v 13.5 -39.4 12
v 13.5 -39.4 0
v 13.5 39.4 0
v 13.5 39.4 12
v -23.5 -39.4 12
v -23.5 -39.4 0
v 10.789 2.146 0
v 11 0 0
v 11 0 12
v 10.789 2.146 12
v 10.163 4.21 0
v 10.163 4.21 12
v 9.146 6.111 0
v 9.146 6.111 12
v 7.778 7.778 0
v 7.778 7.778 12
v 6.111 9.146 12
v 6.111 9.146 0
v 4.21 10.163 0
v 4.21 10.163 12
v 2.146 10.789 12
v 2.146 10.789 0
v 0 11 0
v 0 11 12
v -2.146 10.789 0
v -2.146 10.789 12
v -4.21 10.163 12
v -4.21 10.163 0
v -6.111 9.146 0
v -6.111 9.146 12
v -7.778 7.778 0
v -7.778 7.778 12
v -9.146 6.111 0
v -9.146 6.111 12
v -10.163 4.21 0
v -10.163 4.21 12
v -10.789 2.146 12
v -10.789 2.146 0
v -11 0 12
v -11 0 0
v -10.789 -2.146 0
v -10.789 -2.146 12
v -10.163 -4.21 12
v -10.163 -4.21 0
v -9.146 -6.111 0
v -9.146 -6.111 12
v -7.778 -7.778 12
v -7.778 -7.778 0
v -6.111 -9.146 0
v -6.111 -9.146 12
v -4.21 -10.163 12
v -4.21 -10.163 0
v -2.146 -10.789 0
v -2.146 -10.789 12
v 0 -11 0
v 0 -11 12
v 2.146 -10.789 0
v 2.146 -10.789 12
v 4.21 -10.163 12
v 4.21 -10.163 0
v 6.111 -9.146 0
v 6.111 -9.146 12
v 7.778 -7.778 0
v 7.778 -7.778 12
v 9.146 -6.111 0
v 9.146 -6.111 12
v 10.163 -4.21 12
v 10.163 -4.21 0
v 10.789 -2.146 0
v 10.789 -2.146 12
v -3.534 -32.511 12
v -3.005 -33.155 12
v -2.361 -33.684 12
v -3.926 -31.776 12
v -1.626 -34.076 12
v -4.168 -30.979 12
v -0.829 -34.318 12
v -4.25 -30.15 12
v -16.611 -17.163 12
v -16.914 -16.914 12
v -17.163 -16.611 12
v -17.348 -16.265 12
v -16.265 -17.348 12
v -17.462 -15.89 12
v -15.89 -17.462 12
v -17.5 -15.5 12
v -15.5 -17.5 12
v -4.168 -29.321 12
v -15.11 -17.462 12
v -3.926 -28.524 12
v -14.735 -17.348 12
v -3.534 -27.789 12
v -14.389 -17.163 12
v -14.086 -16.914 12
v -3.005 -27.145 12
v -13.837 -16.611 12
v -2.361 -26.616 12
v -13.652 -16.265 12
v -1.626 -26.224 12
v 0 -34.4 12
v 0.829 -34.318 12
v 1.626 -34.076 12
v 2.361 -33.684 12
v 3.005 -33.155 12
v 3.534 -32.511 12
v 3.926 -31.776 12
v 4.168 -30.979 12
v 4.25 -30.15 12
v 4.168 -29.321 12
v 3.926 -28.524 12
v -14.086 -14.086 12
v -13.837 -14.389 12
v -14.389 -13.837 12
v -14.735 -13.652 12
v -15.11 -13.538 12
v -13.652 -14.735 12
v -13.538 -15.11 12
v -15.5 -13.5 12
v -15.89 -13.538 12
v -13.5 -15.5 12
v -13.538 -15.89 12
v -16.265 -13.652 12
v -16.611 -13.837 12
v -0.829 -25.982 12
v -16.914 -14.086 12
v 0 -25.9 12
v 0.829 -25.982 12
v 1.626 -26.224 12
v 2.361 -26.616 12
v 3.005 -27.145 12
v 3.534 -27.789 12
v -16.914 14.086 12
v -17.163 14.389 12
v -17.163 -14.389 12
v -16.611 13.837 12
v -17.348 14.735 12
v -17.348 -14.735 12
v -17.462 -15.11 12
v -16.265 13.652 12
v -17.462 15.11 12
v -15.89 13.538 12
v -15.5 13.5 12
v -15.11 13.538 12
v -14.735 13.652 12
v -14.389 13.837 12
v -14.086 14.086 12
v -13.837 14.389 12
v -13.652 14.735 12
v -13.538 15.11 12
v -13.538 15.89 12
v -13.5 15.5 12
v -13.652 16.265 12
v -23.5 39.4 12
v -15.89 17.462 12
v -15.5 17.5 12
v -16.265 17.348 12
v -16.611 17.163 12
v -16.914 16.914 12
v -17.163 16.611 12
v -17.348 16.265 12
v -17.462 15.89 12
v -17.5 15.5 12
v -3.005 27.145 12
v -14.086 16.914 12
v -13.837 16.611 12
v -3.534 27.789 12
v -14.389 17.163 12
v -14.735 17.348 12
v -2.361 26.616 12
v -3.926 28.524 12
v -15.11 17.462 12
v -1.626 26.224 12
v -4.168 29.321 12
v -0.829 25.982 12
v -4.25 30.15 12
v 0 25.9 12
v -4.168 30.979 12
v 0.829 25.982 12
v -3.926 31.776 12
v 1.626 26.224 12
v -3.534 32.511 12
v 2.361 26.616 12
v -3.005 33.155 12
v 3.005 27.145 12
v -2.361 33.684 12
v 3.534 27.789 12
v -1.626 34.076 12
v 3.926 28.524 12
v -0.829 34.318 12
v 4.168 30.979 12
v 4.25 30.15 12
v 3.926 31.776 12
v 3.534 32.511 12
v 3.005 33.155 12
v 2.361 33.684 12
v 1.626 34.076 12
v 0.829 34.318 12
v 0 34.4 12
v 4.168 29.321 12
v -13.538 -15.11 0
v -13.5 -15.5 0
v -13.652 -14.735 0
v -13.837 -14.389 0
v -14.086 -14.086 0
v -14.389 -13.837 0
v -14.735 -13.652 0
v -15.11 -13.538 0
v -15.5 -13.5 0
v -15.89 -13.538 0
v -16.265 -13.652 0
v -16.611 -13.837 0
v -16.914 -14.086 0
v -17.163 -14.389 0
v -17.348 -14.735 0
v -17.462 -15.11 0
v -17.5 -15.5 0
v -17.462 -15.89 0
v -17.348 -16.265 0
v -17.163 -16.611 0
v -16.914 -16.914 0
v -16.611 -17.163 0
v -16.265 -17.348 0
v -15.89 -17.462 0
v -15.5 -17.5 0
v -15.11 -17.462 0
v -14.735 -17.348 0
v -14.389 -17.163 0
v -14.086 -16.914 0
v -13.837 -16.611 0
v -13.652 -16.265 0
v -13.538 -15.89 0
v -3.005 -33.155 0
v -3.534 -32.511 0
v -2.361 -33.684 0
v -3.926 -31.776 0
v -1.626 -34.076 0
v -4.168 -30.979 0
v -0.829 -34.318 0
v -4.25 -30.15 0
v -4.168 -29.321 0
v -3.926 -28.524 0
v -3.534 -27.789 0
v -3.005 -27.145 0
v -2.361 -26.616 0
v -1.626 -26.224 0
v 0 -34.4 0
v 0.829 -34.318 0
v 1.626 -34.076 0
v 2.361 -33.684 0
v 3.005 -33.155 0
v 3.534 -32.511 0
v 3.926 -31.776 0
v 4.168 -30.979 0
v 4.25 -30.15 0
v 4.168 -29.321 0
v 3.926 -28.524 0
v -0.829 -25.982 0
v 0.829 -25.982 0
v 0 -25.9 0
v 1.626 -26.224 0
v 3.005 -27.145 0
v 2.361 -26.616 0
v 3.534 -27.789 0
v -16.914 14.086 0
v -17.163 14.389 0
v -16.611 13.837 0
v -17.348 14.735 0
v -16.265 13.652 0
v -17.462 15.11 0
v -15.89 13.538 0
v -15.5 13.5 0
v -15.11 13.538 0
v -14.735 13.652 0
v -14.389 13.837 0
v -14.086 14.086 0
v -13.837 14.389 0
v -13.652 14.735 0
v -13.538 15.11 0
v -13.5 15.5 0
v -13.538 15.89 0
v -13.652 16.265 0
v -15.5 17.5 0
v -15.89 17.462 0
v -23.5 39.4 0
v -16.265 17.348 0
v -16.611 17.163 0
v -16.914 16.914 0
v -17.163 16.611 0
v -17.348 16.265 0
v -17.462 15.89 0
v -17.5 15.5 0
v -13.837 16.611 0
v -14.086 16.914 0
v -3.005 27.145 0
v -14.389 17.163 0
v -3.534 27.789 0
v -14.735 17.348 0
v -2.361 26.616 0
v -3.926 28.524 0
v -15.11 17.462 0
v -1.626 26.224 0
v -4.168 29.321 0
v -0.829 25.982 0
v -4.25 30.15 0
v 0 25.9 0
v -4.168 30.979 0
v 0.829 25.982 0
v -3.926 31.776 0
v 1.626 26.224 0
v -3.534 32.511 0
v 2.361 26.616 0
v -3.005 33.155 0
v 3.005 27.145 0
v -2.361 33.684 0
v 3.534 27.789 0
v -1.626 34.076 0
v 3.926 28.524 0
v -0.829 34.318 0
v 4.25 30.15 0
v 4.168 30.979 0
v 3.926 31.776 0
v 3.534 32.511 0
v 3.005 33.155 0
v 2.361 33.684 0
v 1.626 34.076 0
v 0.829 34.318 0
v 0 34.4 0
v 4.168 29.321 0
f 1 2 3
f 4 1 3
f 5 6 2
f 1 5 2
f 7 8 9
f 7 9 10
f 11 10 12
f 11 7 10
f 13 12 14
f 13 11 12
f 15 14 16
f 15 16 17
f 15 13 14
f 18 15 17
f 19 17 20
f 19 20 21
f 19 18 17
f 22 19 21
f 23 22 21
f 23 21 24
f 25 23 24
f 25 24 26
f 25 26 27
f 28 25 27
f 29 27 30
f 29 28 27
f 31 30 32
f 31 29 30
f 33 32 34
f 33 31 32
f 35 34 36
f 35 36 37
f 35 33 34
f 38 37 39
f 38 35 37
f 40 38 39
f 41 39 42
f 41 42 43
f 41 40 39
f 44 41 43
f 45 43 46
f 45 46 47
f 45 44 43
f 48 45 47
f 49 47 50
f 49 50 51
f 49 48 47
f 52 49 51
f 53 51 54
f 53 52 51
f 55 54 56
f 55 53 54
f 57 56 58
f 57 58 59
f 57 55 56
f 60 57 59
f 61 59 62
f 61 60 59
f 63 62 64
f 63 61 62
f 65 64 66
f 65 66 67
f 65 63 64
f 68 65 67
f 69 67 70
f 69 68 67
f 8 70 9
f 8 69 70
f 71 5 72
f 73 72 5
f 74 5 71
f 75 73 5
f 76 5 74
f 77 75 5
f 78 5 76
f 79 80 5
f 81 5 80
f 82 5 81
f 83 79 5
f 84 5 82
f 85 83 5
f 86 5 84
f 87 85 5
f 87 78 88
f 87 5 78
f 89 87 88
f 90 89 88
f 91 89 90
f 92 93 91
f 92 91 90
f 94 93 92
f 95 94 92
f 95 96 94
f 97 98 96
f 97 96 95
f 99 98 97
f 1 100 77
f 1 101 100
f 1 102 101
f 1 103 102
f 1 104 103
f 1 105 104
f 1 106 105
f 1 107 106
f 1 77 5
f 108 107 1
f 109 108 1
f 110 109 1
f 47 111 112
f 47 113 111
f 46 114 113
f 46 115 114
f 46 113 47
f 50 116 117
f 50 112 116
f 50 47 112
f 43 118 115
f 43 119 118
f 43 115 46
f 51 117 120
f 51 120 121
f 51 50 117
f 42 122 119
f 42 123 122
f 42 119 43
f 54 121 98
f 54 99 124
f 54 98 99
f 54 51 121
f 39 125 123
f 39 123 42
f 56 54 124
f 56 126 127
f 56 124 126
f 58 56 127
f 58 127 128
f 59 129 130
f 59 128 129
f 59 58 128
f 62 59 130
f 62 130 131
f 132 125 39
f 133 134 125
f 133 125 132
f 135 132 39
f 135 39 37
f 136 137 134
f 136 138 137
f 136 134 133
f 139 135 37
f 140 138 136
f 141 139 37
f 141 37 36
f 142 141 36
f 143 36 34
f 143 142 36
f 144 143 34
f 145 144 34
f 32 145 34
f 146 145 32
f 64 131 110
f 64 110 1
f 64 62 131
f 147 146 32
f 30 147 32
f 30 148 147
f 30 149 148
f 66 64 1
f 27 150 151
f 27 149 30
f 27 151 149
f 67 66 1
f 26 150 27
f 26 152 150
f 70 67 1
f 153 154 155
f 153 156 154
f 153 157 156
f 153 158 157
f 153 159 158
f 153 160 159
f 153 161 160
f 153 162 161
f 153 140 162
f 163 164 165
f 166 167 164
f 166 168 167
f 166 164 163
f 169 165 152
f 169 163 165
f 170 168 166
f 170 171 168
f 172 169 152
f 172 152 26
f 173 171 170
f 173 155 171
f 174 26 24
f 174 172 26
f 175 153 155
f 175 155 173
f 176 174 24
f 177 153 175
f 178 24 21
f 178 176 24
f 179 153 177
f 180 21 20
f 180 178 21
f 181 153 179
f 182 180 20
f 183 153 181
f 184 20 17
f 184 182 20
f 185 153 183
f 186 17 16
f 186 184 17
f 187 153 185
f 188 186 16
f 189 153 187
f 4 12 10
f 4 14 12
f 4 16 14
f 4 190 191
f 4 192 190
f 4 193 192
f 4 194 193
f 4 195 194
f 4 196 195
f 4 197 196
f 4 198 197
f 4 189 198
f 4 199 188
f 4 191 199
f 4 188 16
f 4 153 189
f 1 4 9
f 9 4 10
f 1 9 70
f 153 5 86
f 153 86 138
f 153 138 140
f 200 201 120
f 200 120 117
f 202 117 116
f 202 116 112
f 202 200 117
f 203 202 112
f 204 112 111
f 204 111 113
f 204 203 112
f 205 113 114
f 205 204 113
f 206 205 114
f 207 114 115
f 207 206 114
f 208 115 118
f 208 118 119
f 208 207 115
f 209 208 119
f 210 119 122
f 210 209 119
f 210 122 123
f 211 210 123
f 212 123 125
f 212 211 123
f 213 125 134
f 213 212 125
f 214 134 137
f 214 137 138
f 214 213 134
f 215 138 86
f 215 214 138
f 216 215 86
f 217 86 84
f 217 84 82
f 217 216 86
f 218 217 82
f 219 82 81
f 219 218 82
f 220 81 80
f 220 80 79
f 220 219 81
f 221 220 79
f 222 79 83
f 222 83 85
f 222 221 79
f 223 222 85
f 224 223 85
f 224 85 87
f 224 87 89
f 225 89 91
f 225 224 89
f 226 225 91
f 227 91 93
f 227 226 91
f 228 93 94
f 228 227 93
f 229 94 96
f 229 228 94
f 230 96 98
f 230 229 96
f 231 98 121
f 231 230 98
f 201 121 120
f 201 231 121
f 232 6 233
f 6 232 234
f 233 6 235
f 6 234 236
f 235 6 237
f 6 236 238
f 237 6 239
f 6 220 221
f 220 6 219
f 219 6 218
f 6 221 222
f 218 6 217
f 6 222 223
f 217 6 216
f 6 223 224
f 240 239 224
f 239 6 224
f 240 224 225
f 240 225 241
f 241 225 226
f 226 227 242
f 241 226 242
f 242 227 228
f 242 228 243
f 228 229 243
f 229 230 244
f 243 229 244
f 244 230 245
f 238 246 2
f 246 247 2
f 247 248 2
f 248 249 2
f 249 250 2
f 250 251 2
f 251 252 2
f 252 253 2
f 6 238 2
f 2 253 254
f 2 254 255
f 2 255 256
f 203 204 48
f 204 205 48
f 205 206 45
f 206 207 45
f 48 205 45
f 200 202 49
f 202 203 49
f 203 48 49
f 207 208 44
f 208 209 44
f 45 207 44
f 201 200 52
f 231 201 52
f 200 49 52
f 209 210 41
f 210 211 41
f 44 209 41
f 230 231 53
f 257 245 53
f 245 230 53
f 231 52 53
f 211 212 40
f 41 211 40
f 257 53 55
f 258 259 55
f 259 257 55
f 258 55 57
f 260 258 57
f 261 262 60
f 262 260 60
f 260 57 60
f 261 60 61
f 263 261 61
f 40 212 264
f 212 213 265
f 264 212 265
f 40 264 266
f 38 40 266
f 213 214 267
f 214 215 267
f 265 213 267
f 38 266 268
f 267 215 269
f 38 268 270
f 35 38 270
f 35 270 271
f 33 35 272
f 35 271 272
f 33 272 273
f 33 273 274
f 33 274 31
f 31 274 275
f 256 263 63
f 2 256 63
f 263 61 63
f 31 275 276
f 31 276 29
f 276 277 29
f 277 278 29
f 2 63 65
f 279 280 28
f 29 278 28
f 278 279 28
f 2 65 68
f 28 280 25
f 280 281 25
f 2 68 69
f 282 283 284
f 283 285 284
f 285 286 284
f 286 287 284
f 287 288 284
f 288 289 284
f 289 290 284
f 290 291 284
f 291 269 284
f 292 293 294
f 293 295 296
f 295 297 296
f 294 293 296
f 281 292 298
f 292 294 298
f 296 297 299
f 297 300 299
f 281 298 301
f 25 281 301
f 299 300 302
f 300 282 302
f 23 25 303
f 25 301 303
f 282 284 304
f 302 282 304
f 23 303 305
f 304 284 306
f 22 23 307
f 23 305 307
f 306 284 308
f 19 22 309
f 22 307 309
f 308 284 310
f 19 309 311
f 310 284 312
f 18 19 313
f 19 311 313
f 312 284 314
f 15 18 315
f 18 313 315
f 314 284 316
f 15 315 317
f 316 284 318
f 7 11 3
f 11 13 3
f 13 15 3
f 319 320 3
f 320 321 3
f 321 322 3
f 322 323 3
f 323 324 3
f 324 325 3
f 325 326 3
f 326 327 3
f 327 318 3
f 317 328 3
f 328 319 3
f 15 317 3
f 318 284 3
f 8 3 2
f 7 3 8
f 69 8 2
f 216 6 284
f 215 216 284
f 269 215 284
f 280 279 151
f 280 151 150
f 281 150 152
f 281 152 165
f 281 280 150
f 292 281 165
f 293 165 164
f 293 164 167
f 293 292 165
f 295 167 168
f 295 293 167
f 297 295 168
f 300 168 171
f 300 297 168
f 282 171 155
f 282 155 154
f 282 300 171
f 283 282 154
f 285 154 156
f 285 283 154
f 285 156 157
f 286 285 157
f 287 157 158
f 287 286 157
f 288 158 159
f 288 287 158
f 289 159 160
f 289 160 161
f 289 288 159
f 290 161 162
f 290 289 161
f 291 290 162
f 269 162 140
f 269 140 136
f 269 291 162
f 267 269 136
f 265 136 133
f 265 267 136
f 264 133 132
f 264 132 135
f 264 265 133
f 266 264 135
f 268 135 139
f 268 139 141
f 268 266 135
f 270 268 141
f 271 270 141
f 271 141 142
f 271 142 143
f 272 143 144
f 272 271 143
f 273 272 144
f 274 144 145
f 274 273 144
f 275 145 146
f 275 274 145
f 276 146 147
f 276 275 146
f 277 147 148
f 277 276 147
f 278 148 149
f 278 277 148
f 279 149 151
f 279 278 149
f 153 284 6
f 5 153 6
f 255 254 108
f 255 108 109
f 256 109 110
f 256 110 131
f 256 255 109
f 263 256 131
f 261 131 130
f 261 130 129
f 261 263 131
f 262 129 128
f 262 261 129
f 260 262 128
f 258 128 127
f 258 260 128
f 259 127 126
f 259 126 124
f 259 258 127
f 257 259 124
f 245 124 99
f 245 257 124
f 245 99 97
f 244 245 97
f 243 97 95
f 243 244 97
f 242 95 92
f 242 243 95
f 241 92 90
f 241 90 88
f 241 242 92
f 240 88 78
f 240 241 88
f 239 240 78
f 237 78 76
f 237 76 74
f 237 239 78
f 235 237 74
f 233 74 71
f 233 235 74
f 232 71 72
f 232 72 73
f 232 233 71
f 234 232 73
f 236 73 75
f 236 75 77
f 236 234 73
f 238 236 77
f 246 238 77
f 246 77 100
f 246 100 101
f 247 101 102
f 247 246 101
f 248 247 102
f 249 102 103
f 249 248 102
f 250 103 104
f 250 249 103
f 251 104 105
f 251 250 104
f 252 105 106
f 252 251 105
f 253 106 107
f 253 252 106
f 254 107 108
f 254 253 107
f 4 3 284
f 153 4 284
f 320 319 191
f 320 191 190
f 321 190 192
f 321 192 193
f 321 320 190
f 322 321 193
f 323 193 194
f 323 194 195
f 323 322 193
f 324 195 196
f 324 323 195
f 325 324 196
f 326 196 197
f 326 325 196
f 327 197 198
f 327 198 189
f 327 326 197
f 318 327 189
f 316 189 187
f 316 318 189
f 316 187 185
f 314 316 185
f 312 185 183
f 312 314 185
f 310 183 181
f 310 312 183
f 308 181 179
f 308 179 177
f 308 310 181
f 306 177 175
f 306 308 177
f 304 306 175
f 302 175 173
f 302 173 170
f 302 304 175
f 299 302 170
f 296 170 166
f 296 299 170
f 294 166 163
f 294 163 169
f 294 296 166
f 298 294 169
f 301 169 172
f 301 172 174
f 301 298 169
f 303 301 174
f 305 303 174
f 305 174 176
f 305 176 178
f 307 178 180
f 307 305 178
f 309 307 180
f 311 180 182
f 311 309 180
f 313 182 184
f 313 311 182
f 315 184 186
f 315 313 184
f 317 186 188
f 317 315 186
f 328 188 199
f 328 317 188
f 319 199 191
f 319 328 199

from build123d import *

# Parameters (mm, degrees)
F0_R     = 2
F0_R_2   = 4.25
F0_R_3   = 11
F1_DEPTH = 12


with BuildPart() as f1:
    # F0 (on Top) → F1 (new body)
    with BuildSketch(Plane.XY):
        Polygon((13.5, -39.4), (13.5, -15.5), (13.5, 15.5), (13.5, 39.4), (-23.5, 39.4), (-23.5, 19.5), (-23.5, -19.5), (-23.5, -39.4), align=None)
        with Locations((-15.5, -15.5)):
            Circle(F0_R, mode=Mode.SUBTRACT)
        with Locations((0, -30.15)):
            Circle(F0_R_2, mode=Mode.SUBTRACT)
        with Locations((-15.5, 15.5)):
            Circle(F0_R, mode=Mode.SUBTRACT)
        Circle(F0_R_3, mode=Mode.SUBTRACT)
        with Locations((0, 30.15)):
            Circle(F0_R_2, mode=Mode.SUBTRACT)
    extrude(amount=F1_DEPTH)


solid = f1.part
